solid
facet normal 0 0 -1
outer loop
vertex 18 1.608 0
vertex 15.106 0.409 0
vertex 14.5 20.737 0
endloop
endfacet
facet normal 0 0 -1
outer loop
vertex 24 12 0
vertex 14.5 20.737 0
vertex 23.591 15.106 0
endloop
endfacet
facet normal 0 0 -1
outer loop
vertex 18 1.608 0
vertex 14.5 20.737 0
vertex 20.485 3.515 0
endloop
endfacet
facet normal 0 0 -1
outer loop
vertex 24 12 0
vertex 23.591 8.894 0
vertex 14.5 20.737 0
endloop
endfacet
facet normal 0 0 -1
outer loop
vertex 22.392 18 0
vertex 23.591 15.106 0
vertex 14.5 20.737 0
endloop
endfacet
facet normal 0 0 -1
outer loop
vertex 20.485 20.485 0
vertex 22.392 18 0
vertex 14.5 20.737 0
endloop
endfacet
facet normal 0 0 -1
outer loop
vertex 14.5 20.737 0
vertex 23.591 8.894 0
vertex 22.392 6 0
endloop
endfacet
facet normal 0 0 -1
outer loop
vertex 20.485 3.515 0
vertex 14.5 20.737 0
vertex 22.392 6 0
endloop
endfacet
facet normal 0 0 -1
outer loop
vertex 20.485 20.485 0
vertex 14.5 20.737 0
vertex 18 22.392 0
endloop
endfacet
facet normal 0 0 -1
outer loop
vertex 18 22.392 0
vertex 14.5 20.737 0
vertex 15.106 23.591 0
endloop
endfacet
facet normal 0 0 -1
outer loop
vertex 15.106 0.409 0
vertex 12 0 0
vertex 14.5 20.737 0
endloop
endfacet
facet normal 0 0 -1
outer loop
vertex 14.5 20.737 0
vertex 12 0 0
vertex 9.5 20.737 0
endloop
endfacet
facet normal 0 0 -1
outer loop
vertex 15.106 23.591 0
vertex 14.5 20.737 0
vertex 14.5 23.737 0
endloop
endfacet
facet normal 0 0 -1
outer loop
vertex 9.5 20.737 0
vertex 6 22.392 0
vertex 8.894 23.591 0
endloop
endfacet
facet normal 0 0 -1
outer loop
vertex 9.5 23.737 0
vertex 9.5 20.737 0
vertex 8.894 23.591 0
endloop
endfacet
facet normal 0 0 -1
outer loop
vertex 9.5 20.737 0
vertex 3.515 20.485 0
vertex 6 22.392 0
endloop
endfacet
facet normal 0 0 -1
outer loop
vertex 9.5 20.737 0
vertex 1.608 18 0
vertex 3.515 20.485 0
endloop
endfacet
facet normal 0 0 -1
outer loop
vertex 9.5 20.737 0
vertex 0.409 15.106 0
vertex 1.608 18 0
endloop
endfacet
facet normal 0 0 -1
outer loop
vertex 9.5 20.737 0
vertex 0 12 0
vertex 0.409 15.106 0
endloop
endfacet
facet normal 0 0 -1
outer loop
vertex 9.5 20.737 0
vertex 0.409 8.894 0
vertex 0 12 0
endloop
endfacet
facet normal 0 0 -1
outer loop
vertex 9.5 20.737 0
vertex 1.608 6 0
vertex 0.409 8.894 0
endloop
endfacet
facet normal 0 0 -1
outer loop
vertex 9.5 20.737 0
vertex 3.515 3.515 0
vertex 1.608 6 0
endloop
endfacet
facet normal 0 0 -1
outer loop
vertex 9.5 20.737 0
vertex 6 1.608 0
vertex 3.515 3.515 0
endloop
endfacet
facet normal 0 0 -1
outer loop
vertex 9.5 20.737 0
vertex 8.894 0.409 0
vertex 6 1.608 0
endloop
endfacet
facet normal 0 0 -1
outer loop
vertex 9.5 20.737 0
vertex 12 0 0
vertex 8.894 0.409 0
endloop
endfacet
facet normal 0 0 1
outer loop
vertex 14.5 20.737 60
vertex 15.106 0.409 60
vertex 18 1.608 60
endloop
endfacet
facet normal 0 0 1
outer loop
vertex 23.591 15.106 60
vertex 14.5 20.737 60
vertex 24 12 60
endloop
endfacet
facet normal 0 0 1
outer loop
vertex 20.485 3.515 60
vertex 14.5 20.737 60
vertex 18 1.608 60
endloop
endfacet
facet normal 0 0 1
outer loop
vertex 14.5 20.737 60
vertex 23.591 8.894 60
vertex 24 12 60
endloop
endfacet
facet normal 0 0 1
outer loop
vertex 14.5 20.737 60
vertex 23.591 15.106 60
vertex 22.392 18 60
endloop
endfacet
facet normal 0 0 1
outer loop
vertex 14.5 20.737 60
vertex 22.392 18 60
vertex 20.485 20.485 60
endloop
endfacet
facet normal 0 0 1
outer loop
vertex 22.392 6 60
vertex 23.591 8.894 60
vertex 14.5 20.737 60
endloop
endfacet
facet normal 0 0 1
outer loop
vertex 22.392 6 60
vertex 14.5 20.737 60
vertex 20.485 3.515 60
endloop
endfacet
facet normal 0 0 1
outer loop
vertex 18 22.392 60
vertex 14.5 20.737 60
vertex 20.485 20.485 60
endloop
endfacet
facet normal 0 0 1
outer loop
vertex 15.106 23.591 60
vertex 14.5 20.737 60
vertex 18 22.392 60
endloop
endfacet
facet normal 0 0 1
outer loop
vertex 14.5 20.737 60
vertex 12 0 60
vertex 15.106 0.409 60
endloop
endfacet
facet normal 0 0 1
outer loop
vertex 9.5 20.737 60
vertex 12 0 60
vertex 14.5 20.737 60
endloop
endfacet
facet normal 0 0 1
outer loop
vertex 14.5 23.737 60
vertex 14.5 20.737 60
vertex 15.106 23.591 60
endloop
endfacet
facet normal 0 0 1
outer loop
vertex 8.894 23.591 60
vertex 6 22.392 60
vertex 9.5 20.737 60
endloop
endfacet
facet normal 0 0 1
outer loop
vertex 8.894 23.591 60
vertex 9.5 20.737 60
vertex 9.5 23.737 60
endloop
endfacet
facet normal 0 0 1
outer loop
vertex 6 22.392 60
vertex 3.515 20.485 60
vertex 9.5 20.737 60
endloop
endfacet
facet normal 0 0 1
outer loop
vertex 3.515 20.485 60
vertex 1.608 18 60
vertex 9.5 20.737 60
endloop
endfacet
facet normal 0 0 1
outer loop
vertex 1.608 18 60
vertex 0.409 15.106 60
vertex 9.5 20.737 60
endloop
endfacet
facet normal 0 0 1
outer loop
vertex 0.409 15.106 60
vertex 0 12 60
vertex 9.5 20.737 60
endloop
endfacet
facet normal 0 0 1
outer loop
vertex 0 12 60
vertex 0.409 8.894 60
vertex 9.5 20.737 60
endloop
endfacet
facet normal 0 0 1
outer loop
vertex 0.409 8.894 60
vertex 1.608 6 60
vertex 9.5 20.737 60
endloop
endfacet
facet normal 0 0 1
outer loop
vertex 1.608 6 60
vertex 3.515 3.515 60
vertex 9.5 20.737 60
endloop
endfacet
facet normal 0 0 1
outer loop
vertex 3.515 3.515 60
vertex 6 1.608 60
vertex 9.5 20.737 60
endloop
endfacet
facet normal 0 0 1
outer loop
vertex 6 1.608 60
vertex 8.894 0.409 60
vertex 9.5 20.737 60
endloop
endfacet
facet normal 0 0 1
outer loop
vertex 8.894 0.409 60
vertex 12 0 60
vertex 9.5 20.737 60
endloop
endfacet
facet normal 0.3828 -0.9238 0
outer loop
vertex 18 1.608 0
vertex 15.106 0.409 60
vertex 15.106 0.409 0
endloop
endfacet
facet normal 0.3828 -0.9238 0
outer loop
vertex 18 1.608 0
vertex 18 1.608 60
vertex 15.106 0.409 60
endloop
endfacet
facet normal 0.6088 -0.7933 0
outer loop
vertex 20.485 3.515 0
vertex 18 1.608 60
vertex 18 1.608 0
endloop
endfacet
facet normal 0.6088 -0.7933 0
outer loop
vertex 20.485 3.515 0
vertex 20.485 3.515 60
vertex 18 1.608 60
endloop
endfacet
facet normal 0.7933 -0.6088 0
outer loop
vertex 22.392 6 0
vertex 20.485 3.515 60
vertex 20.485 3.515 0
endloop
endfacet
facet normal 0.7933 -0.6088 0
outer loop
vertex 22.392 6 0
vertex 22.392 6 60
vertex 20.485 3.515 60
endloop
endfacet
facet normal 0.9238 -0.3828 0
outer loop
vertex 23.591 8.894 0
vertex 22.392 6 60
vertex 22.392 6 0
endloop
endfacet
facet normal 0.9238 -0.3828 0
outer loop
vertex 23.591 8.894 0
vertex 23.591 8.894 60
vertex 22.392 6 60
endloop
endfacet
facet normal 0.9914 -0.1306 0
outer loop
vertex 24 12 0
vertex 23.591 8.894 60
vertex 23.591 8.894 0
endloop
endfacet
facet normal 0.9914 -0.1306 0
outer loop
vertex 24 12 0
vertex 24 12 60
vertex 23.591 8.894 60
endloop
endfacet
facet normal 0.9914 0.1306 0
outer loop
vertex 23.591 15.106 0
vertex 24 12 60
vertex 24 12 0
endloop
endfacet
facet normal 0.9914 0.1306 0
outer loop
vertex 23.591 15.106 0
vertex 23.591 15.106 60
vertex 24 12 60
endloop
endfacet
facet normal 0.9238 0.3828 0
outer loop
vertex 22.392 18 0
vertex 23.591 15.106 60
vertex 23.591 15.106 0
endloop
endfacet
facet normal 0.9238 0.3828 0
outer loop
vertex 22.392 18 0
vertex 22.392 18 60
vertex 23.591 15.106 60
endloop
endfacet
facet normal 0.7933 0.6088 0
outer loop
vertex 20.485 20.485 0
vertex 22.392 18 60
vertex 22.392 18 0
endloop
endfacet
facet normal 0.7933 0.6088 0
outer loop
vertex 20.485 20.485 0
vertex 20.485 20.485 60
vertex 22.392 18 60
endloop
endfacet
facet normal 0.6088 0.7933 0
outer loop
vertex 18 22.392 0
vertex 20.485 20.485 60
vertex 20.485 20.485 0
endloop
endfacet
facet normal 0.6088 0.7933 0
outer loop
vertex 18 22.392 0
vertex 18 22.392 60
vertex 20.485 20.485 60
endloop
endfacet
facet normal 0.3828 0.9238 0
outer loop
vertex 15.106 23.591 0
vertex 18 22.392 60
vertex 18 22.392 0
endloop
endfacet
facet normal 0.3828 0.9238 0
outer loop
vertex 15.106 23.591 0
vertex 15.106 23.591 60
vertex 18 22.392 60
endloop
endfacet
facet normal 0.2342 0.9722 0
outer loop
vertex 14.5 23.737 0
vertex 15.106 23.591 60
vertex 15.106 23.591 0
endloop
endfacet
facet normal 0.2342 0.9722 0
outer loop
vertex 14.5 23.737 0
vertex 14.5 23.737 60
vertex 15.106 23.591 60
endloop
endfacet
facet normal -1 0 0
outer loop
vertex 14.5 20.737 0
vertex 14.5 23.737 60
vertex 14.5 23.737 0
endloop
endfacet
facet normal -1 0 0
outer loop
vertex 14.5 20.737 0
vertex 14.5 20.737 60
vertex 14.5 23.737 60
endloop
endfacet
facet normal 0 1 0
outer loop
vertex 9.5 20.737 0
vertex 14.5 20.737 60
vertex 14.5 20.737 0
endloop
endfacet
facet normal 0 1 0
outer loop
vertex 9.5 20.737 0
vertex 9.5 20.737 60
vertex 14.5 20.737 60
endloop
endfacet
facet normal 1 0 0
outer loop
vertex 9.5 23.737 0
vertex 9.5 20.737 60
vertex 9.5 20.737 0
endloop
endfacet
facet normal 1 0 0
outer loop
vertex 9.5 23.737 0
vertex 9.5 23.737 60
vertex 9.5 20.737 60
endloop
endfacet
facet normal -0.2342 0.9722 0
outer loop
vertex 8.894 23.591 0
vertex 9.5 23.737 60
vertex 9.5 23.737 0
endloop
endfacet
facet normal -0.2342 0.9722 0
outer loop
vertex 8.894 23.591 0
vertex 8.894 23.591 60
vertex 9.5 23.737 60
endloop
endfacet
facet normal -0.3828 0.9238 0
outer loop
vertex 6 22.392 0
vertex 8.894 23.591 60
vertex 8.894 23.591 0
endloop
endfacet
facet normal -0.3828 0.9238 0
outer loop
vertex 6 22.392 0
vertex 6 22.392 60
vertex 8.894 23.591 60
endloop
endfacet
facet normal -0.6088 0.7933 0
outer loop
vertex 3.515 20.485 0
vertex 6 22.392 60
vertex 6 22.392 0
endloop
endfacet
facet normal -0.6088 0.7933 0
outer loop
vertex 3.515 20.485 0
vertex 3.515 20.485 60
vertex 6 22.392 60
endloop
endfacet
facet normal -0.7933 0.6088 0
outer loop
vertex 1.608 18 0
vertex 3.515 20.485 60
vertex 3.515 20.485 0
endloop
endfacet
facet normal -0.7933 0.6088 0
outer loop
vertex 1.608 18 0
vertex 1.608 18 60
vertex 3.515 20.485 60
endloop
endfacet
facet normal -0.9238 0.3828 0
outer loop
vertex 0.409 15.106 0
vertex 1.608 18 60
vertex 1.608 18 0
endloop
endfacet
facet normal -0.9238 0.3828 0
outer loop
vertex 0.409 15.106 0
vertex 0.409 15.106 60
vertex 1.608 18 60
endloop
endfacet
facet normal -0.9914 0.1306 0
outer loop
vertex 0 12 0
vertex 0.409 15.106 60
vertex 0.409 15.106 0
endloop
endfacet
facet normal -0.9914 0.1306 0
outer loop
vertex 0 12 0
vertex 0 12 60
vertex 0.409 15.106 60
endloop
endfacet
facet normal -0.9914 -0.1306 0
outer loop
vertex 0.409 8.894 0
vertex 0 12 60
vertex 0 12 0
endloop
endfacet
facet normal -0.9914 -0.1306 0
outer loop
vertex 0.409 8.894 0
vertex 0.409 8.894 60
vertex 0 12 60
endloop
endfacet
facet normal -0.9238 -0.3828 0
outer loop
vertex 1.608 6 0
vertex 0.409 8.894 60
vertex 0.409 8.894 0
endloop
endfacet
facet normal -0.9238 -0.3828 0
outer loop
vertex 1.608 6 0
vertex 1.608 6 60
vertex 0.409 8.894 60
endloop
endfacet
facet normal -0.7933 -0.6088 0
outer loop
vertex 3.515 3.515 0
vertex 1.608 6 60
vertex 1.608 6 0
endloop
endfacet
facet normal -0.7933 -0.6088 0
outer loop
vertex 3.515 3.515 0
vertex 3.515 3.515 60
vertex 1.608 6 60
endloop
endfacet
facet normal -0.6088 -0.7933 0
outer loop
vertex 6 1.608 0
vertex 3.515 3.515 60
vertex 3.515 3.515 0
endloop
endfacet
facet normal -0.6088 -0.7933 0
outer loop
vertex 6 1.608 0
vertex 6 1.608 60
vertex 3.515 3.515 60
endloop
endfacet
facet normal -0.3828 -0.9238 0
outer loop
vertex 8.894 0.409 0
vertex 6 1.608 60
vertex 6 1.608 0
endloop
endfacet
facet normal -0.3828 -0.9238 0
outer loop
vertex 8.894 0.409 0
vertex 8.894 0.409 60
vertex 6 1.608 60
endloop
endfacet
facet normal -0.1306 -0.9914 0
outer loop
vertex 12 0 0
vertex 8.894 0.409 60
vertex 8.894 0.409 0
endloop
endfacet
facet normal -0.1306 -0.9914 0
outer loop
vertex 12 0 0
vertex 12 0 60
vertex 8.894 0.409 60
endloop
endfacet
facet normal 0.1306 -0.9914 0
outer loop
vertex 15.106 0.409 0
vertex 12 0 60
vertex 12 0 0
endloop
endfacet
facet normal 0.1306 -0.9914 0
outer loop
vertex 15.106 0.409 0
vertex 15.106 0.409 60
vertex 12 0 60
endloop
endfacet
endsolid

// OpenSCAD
$fn = 32;

// ----------------------------------------------------------------------
// Keyway shaft: d24 shaft, key 5 x 3 mm
// ----------------------------------------------------------------------

// --- parameters (mm) ---
shaft_r = 12;             // shaft radius
key_w = 5;                // keyway width
key_d = 3;                // keyway depth below the surface line
plate_t = 60;             // shaft length, Z (extrusion height)

shaft_d = 2 * shaft_r;  // shaft diameter
circle_step = 15;  // polygon sampling step, degrees

profile = [[8.894, 23.591], [6, 22.392], [3.515, 20.485], [1.608, 18], [0.409, 15.106], [0, 12], [0.409, 8.894], [1.608, 6], [3.515, 3.515], [6, 1.608], [8.894, 0.409], [12, 0], [15.106, 0.409], [18, 1.608], [20.485, 3.515], [22.392, 6], [23.591, 8.894], [24, 12], [23.591, 15.106], [22.392, 18], [20.485, 20.485], [18, 22.392], [15.106, 23.591], [14.5, 23.737], [14.5, 20.737], [9.5, 20.737], [9.5, 23.737]];  // primary outline, 27 points, counter clockwise

// --- the one profile operation ---
linear_extrude(height = plate_t) polygon(points = profile);
